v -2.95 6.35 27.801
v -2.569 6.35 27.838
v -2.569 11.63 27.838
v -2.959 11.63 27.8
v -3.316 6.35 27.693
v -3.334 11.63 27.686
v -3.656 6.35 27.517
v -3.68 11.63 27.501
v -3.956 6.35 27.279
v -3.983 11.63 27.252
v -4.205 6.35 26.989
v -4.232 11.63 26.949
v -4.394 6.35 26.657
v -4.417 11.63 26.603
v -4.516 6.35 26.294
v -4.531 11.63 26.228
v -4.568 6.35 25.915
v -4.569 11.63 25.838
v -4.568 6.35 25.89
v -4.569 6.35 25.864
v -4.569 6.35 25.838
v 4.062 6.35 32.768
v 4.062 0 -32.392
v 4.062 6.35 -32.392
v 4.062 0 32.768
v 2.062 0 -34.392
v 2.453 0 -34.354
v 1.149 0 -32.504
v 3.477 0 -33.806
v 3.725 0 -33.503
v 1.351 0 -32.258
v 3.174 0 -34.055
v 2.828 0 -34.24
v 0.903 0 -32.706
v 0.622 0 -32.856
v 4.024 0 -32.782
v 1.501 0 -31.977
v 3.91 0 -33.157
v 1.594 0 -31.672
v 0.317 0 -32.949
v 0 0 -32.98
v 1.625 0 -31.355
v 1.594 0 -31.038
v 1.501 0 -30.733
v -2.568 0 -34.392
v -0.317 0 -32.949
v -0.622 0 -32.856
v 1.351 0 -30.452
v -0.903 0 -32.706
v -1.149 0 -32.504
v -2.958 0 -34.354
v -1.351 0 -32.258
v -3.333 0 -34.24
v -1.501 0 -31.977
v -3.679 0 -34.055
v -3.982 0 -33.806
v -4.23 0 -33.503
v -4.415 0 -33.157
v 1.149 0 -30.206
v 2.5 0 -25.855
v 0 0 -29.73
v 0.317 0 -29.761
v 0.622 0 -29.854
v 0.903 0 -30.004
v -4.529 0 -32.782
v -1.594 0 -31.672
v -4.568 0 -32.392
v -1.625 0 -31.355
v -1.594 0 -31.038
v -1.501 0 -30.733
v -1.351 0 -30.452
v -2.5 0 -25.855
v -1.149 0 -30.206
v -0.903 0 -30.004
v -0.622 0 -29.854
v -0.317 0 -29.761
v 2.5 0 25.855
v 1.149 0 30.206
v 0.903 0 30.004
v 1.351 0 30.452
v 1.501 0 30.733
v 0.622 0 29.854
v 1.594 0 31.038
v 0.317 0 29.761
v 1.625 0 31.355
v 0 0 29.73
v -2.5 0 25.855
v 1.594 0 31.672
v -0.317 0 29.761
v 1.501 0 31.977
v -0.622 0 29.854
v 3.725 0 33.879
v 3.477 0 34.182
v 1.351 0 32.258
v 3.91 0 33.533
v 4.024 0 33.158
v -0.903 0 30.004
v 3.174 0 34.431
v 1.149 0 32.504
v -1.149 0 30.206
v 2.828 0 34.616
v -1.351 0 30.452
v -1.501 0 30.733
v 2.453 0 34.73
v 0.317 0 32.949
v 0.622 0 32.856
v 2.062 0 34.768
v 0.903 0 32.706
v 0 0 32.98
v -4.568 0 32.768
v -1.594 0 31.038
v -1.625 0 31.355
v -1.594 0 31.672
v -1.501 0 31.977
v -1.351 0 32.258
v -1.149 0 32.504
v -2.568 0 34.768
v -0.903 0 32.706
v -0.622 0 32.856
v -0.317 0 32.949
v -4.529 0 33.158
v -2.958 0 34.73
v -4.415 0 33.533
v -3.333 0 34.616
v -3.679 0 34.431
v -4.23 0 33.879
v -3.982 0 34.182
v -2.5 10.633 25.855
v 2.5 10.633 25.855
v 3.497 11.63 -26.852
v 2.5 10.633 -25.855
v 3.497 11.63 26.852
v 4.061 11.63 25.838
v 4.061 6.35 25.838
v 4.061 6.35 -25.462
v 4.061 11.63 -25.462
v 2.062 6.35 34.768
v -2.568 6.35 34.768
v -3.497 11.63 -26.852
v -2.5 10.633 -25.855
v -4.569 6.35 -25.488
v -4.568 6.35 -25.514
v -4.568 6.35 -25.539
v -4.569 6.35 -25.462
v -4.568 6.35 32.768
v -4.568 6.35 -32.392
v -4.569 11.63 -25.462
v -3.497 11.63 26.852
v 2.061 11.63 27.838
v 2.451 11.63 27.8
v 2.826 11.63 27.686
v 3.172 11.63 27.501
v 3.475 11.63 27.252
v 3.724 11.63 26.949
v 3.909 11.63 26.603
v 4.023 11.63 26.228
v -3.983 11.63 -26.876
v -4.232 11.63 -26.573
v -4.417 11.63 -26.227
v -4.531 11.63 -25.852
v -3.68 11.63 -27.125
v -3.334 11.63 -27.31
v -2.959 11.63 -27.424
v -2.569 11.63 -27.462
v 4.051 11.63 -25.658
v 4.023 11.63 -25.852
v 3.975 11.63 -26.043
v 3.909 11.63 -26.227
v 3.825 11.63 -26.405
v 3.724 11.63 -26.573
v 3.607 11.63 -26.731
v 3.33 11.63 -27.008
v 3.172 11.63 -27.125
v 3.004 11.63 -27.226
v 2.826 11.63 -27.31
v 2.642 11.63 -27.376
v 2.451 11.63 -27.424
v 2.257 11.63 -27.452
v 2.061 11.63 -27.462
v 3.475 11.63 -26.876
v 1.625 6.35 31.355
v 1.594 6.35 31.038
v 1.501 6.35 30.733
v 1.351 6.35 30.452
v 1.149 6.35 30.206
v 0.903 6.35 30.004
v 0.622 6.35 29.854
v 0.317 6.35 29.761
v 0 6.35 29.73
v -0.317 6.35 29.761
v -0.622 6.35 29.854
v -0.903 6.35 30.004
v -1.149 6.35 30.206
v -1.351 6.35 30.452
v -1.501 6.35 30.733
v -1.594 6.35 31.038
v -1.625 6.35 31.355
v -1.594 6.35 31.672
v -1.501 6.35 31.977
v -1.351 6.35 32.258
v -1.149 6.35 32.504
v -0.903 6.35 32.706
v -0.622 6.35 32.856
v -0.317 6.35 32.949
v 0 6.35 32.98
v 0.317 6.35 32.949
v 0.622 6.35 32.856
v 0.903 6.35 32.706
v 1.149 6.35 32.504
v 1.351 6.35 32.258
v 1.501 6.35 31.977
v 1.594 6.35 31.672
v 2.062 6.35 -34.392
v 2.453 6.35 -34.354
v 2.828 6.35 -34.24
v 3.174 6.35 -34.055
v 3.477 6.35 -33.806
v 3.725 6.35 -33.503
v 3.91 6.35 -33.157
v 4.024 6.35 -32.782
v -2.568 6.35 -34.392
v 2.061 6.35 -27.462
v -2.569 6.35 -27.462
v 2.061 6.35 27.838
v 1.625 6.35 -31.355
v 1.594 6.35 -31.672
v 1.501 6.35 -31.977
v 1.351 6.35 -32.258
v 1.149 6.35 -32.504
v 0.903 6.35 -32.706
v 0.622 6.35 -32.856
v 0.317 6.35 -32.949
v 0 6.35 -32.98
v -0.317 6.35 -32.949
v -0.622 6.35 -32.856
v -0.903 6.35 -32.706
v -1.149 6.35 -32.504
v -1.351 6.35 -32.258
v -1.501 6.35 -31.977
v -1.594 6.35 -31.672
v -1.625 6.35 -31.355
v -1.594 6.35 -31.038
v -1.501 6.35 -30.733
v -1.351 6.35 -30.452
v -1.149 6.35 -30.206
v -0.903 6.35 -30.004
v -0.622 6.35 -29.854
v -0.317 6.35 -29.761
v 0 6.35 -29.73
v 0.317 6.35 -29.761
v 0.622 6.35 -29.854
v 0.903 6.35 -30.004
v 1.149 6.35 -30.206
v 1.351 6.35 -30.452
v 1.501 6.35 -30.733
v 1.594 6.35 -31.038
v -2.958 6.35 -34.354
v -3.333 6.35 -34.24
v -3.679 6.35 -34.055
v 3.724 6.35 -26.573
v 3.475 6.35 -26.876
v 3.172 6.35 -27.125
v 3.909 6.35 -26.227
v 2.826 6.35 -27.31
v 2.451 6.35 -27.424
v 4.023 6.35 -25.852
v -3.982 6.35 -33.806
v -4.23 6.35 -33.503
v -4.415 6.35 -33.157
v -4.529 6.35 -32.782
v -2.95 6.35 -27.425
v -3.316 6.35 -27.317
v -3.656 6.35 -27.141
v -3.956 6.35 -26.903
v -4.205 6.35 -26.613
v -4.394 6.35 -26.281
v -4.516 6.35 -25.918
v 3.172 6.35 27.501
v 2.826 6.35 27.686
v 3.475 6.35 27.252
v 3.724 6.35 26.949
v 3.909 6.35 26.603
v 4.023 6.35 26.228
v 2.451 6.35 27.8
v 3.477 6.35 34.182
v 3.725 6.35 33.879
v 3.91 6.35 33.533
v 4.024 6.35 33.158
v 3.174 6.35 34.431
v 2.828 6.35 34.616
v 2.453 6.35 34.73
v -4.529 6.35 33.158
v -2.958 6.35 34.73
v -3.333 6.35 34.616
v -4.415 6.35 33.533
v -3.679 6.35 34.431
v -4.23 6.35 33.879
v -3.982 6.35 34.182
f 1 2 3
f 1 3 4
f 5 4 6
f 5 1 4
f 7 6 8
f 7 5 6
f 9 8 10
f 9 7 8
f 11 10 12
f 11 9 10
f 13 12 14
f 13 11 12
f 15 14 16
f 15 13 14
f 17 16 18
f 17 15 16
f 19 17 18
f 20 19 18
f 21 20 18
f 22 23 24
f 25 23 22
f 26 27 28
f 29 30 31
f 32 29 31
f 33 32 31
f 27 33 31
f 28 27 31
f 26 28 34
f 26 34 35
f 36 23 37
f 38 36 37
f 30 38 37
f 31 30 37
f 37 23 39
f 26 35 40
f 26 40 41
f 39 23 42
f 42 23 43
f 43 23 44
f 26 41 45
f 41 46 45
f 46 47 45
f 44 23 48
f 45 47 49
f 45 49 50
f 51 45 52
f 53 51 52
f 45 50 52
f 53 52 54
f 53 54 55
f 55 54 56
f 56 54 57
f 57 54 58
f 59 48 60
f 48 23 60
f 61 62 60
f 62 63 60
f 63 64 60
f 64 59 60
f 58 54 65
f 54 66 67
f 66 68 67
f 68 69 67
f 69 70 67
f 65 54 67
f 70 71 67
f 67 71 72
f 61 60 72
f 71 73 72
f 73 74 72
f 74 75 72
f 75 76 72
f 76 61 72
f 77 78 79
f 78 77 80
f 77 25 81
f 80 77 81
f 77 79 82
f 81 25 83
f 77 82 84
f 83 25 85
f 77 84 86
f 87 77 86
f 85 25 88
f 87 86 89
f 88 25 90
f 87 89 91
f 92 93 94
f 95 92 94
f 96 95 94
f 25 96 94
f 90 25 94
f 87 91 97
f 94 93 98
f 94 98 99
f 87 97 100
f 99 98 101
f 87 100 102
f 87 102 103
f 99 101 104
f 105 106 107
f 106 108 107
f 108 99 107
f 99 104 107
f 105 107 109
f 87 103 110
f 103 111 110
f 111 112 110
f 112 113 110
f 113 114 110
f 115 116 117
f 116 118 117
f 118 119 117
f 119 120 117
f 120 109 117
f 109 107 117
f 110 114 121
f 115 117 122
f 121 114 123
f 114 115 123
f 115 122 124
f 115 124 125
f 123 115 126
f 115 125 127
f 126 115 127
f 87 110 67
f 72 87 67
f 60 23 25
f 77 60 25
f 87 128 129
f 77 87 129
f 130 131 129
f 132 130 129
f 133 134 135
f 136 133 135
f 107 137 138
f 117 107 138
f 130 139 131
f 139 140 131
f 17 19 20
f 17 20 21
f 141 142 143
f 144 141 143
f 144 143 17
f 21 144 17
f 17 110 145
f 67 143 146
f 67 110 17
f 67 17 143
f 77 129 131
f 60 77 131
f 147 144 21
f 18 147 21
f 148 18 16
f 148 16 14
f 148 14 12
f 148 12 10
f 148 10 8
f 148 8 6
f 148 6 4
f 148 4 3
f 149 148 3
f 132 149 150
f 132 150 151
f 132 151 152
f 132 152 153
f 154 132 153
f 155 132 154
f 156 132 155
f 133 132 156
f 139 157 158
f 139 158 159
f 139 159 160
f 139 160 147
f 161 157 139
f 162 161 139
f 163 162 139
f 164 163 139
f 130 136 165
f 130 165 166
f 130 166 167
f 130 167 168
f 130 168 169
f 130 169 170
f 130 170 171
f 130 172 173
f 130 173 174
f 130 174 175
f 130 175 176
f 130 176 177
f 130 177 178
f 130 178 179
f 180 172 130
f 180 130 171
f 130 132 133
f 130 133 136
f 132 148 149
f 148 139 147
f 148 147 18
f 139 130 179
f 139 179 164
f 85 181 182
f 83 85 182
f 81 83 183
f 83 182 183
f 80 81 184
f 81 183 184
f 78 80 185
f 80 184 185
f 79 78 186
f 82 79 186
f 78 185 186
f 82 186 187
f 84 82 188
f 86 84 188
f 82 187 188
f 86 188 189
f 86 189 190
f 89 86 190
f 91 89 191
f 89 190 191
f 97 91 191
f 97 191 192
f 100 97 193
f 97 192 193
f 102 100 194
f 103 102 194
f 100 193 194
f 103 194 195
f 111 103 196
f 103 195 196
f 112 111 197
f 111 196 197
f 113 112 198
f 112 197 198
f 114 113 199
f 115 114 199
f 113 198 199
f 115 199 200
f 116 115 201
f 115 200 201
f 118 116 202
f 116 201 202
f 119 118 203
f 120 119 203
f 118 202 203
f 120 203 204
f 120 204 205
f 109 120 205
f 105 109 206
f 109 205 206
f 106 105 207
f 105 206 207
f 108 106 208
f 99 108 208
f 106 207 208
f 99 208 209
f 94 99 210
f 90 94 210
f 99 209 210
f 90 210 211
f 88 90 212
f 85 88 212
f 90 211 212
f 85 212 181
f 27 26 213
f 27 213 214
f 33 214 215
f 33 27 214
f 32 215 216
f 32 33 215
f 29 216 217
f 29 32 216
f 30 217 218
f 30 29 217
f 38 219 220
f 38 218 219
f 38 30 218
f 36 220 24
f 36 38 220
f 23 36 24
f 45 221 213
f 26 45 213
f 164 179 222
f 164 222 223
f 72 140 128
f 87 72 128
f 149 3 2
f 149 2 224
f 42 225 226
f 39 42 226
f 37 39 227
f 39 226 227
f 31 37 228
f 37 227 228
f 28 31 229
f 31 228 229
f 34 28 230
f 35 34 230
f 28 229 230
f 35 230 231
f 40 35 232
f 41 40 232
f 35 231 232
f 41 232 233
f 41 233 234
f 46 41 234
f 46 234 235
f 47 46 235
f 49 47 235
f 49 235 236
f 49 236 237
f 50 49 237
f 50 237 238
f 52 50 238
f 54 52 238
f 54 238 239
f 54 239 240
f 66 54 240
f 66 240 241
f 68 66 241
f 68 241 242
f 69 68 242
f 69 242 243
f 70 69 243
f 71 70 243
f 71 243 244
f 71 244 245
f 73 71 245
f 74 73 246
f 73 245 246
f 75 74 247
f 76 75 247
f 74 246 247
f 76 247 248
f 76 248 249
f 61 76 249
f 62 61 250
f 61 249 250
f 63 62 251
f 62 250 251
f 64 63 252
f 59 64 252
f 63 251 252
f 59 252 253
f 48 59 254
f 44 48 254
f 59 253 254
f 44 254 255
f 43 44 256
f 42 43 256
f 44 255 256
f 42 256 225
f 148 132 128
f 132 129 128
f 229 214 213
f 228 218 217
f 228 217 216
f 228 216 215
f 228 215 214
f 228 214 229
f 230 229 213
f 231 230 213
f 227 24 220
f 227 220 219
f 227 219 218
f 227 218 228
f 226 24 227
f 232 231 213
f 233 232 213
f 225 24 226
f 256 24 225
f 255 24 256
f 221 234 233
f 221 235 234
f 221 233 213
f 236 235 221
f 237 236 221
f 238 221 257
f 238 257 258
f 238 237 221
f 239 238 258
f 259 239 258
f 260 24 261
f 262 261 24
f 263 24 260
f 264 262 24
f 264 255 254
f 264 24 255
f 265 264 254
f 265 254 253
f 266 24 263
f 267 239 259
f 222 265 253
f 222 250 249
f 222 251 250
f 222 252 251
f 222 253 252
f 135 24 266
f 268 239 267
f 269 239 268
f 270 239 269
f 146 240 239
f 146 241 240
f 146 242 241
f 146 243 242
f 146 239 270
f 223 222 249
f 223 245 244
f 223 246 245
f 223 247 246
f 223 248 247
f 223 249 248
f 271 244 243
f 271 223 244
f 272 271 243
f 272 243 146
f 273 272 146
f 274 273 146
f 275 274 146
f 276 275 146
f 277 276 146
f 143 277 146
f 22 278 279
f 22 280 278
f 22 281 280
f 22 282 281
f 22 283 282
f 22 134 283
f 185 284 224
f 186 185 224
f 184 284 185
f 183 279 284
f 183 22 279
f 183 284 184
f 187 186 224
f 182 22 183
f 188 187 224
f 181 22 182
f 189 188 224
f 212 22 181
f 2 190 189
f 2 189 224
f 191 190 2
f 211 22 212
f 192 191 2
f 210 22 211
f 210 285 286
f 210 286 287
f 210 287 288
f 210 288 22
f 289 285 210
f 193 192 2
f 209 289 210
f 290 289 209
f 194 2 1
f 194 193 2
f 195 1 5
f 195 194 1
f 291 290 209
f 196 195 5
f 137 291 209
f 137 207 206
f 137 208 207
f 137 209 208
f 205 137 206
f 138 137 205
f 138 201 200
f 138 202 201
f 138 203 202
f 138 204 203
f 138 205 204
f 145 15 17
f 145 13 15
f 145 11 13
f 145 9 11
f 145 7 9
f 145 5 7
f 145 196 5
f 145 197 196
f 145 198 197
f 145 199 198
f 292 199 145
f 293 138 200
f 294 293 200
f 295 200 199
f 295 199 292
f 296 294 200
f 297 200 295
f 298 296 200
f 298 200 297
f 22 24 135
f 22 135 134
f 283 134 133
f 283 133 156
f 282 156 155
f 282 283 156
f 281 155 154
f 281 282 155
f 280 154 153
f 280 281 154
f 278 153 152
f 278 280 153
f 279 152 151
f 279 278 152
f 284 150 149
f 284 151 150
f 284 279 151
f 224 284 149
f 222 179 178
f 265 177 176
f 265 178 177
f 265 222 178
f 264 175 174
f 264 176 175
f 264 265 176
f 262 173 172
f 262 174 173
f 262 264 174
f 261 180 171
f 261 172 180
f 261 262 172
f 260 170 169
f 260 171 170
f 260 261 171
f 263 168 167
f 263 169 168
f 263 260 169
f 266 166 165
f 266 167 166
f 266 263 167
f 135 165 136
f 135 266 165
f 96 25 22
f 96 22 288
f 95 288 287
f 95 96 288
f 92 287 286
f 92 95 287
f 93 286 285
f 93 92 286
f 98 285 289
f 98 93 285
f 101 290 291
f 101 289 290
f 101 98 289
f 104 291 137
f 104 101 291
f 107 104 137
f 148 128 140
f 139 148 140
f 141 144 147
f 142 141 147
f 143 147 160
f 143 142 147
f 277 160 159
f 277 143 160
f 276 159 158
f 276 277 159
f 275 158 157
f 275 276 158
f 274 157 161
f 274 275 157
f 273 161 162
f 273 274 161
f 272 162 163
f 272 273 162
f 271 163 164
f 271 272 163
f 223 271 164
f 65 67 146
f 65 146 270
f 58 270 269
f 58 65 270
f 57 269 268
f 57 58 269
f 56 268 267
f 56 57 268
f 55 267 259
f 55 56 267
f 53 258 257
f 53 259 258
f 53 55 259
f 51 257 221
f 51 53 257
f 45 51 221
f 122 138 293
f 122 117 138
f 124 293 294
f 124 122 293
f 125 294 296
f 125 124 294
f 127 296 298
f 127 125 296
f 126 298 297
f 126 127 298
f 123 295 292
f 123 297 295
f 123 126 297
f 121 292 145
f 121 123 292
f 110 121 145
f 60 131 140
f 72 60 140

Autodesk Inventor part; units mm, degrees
ref_plane "YZ Plane" through (0, 0, 0) normal (1, 0, 0) x (0, 1, 0)
ref_plane "XZ Plane" through (0, 0, 0) normal (0, 1, 0) x (-1, 0, 0)
ref_plane "XY Plane" through (0, 0, 0) normal (0, 0, 1) x (1, 0, 0)
sketch "Sketch1" plane through (0, 0, 0) normal (0, 1, 0) x (-1, 0, 0)
  line L0 (2.5675, -34.392) -> (-2.0625, -34.392)
  line L1 (-4.0625, -32.392) -> (-4.0625, 32.768)
  line L2 (-2.0625, 34.768) -> (2.5675, 34.768)
  line L3 (4.5675, 32.768) -> (4.5675, -32.392)
  arc A0 (4.5675, 32.768) -> (2.5675, 34.768) centre (2.5675, 32.768) ccw
  arc A1 (-2.0625, 34.768) -> (-4.0625, 32.768) centre (-2.0625, 32.768) ccw
  arc A2 (-4.0625, -32.392) -> (-2.0625, -34.392) centre (-2.0625, -32.392) ccw
  arc A3 (2.5675, -34.392) -> (4.5675, -32.392) centre (2.5675, -32.392) ccw
  point P0 (0, 0)
  point P1 (-4.0625, 34.768)
  point P2 (-4.0625, -34.392)
  point P3 (4.5675, 34.768)
  dimension "d0" = 8.63
  dimension "d1" = 69.16
  dimension "d2" = 2
extrude "Extrusion1" add sketch "Sketch1" along normal blind 6.35
sketch "Sketch2" plane through (0, 6.35, 0) normal (0, 1, 0) x (1, 0, 0)
  circle A0 centre (0, -31.355) radius 1.625
  circle A1 centre (0, 31.355) radius 1.625
  point P0 (0, 0)
  dimension "d5" = 3.25
  dimension "d6" = 3.25
  dimension "d7" = 31.355
  dimension "d8" = 31.355
extrude "Extrusion2" cut sketch "Sketch2" against normal blind 6.35
sketch "Sketch3" plane through (0, 6.35, 0) normal (0, 1, 0) x (1, 0, 0)
  line L0 (-2.569, -27.838) -> (2.061, -27.838)
  line L1 (4.061, -25.838) -> (4.061, 25.462)
  line L2 (2.061, 27.462) -> (-2.569, 27.462)
  line L3 (-4.569, 25.462) -> (-4.569, -25.838)
  line L4 (-2.5675, -34.768) -> (2.0625, -34.768) projected
  arc A0 (-4.569, -25.838) -> (-2.569, -27.838) centre (-2.569, -25.838) ccw
  arc A1 (2.061, -27.838) -> (4.061, -25.838) centre (2.061, -25.838) ccw
  arc A2 (4.061, 25.462) -> (2.061, 27.462) centre (2.061, 25.462) ccw
  arc A3 (-2.569, 27.462) -> (-4.569, 25.462) centre (-2.569, 25.462) ccw
  point P0 (0, 0)
  point P1 (4.061, 27.462)
  point P2 (4.061, -27.838)
  point P3 (-4.569, 27.462)
  dimension "d11" = 8.63
  dimension "d12" = 55.3
  dimension "d13" = 6.93
  dimension "d14" = 2
extrude "Extrusion3" add sketch "Sketch3" along normal blind 5.28
sketch "Sketch4" plane through (0, 11.63, 0) normal (0, 1, 0) x (1, 0, 0)
  line L0 (2.5, 25.855) -> (-2.5, 25.855)
  line L1 (-2.5, 25.855) -> (-2.5, -25.855)
  line L2 (-2.5, -25.855) -> (2.5, -25.855)
  line L3 (2.5, -25.855) -> (2.5, 25.855)
  line L4 (2.5, 25.855) -> (-2.5, -25.855) construction
  line L5 (-2.5, 25.855) -> (2.5, -25.855) construction
  point P0 (0, 0)
  dimension "d17" = 5
  dimension "d18" = 51.71
extrude "Extrusion4" cut sketch "Sketch4" against normal blind 11.63
chamfer "Chamfer1" distance 1 angle 45 4 edges at (-2.5, 11.63, 0) (0, 11.63, 25.855) (2.5, 11.63, 0) (0, 11.63, -25.855)
sketch "Sketch5" plane through (0, 0, 0) normal (0, -1, 0) x (1, 0, 0)
  point P0 (0, 0)
